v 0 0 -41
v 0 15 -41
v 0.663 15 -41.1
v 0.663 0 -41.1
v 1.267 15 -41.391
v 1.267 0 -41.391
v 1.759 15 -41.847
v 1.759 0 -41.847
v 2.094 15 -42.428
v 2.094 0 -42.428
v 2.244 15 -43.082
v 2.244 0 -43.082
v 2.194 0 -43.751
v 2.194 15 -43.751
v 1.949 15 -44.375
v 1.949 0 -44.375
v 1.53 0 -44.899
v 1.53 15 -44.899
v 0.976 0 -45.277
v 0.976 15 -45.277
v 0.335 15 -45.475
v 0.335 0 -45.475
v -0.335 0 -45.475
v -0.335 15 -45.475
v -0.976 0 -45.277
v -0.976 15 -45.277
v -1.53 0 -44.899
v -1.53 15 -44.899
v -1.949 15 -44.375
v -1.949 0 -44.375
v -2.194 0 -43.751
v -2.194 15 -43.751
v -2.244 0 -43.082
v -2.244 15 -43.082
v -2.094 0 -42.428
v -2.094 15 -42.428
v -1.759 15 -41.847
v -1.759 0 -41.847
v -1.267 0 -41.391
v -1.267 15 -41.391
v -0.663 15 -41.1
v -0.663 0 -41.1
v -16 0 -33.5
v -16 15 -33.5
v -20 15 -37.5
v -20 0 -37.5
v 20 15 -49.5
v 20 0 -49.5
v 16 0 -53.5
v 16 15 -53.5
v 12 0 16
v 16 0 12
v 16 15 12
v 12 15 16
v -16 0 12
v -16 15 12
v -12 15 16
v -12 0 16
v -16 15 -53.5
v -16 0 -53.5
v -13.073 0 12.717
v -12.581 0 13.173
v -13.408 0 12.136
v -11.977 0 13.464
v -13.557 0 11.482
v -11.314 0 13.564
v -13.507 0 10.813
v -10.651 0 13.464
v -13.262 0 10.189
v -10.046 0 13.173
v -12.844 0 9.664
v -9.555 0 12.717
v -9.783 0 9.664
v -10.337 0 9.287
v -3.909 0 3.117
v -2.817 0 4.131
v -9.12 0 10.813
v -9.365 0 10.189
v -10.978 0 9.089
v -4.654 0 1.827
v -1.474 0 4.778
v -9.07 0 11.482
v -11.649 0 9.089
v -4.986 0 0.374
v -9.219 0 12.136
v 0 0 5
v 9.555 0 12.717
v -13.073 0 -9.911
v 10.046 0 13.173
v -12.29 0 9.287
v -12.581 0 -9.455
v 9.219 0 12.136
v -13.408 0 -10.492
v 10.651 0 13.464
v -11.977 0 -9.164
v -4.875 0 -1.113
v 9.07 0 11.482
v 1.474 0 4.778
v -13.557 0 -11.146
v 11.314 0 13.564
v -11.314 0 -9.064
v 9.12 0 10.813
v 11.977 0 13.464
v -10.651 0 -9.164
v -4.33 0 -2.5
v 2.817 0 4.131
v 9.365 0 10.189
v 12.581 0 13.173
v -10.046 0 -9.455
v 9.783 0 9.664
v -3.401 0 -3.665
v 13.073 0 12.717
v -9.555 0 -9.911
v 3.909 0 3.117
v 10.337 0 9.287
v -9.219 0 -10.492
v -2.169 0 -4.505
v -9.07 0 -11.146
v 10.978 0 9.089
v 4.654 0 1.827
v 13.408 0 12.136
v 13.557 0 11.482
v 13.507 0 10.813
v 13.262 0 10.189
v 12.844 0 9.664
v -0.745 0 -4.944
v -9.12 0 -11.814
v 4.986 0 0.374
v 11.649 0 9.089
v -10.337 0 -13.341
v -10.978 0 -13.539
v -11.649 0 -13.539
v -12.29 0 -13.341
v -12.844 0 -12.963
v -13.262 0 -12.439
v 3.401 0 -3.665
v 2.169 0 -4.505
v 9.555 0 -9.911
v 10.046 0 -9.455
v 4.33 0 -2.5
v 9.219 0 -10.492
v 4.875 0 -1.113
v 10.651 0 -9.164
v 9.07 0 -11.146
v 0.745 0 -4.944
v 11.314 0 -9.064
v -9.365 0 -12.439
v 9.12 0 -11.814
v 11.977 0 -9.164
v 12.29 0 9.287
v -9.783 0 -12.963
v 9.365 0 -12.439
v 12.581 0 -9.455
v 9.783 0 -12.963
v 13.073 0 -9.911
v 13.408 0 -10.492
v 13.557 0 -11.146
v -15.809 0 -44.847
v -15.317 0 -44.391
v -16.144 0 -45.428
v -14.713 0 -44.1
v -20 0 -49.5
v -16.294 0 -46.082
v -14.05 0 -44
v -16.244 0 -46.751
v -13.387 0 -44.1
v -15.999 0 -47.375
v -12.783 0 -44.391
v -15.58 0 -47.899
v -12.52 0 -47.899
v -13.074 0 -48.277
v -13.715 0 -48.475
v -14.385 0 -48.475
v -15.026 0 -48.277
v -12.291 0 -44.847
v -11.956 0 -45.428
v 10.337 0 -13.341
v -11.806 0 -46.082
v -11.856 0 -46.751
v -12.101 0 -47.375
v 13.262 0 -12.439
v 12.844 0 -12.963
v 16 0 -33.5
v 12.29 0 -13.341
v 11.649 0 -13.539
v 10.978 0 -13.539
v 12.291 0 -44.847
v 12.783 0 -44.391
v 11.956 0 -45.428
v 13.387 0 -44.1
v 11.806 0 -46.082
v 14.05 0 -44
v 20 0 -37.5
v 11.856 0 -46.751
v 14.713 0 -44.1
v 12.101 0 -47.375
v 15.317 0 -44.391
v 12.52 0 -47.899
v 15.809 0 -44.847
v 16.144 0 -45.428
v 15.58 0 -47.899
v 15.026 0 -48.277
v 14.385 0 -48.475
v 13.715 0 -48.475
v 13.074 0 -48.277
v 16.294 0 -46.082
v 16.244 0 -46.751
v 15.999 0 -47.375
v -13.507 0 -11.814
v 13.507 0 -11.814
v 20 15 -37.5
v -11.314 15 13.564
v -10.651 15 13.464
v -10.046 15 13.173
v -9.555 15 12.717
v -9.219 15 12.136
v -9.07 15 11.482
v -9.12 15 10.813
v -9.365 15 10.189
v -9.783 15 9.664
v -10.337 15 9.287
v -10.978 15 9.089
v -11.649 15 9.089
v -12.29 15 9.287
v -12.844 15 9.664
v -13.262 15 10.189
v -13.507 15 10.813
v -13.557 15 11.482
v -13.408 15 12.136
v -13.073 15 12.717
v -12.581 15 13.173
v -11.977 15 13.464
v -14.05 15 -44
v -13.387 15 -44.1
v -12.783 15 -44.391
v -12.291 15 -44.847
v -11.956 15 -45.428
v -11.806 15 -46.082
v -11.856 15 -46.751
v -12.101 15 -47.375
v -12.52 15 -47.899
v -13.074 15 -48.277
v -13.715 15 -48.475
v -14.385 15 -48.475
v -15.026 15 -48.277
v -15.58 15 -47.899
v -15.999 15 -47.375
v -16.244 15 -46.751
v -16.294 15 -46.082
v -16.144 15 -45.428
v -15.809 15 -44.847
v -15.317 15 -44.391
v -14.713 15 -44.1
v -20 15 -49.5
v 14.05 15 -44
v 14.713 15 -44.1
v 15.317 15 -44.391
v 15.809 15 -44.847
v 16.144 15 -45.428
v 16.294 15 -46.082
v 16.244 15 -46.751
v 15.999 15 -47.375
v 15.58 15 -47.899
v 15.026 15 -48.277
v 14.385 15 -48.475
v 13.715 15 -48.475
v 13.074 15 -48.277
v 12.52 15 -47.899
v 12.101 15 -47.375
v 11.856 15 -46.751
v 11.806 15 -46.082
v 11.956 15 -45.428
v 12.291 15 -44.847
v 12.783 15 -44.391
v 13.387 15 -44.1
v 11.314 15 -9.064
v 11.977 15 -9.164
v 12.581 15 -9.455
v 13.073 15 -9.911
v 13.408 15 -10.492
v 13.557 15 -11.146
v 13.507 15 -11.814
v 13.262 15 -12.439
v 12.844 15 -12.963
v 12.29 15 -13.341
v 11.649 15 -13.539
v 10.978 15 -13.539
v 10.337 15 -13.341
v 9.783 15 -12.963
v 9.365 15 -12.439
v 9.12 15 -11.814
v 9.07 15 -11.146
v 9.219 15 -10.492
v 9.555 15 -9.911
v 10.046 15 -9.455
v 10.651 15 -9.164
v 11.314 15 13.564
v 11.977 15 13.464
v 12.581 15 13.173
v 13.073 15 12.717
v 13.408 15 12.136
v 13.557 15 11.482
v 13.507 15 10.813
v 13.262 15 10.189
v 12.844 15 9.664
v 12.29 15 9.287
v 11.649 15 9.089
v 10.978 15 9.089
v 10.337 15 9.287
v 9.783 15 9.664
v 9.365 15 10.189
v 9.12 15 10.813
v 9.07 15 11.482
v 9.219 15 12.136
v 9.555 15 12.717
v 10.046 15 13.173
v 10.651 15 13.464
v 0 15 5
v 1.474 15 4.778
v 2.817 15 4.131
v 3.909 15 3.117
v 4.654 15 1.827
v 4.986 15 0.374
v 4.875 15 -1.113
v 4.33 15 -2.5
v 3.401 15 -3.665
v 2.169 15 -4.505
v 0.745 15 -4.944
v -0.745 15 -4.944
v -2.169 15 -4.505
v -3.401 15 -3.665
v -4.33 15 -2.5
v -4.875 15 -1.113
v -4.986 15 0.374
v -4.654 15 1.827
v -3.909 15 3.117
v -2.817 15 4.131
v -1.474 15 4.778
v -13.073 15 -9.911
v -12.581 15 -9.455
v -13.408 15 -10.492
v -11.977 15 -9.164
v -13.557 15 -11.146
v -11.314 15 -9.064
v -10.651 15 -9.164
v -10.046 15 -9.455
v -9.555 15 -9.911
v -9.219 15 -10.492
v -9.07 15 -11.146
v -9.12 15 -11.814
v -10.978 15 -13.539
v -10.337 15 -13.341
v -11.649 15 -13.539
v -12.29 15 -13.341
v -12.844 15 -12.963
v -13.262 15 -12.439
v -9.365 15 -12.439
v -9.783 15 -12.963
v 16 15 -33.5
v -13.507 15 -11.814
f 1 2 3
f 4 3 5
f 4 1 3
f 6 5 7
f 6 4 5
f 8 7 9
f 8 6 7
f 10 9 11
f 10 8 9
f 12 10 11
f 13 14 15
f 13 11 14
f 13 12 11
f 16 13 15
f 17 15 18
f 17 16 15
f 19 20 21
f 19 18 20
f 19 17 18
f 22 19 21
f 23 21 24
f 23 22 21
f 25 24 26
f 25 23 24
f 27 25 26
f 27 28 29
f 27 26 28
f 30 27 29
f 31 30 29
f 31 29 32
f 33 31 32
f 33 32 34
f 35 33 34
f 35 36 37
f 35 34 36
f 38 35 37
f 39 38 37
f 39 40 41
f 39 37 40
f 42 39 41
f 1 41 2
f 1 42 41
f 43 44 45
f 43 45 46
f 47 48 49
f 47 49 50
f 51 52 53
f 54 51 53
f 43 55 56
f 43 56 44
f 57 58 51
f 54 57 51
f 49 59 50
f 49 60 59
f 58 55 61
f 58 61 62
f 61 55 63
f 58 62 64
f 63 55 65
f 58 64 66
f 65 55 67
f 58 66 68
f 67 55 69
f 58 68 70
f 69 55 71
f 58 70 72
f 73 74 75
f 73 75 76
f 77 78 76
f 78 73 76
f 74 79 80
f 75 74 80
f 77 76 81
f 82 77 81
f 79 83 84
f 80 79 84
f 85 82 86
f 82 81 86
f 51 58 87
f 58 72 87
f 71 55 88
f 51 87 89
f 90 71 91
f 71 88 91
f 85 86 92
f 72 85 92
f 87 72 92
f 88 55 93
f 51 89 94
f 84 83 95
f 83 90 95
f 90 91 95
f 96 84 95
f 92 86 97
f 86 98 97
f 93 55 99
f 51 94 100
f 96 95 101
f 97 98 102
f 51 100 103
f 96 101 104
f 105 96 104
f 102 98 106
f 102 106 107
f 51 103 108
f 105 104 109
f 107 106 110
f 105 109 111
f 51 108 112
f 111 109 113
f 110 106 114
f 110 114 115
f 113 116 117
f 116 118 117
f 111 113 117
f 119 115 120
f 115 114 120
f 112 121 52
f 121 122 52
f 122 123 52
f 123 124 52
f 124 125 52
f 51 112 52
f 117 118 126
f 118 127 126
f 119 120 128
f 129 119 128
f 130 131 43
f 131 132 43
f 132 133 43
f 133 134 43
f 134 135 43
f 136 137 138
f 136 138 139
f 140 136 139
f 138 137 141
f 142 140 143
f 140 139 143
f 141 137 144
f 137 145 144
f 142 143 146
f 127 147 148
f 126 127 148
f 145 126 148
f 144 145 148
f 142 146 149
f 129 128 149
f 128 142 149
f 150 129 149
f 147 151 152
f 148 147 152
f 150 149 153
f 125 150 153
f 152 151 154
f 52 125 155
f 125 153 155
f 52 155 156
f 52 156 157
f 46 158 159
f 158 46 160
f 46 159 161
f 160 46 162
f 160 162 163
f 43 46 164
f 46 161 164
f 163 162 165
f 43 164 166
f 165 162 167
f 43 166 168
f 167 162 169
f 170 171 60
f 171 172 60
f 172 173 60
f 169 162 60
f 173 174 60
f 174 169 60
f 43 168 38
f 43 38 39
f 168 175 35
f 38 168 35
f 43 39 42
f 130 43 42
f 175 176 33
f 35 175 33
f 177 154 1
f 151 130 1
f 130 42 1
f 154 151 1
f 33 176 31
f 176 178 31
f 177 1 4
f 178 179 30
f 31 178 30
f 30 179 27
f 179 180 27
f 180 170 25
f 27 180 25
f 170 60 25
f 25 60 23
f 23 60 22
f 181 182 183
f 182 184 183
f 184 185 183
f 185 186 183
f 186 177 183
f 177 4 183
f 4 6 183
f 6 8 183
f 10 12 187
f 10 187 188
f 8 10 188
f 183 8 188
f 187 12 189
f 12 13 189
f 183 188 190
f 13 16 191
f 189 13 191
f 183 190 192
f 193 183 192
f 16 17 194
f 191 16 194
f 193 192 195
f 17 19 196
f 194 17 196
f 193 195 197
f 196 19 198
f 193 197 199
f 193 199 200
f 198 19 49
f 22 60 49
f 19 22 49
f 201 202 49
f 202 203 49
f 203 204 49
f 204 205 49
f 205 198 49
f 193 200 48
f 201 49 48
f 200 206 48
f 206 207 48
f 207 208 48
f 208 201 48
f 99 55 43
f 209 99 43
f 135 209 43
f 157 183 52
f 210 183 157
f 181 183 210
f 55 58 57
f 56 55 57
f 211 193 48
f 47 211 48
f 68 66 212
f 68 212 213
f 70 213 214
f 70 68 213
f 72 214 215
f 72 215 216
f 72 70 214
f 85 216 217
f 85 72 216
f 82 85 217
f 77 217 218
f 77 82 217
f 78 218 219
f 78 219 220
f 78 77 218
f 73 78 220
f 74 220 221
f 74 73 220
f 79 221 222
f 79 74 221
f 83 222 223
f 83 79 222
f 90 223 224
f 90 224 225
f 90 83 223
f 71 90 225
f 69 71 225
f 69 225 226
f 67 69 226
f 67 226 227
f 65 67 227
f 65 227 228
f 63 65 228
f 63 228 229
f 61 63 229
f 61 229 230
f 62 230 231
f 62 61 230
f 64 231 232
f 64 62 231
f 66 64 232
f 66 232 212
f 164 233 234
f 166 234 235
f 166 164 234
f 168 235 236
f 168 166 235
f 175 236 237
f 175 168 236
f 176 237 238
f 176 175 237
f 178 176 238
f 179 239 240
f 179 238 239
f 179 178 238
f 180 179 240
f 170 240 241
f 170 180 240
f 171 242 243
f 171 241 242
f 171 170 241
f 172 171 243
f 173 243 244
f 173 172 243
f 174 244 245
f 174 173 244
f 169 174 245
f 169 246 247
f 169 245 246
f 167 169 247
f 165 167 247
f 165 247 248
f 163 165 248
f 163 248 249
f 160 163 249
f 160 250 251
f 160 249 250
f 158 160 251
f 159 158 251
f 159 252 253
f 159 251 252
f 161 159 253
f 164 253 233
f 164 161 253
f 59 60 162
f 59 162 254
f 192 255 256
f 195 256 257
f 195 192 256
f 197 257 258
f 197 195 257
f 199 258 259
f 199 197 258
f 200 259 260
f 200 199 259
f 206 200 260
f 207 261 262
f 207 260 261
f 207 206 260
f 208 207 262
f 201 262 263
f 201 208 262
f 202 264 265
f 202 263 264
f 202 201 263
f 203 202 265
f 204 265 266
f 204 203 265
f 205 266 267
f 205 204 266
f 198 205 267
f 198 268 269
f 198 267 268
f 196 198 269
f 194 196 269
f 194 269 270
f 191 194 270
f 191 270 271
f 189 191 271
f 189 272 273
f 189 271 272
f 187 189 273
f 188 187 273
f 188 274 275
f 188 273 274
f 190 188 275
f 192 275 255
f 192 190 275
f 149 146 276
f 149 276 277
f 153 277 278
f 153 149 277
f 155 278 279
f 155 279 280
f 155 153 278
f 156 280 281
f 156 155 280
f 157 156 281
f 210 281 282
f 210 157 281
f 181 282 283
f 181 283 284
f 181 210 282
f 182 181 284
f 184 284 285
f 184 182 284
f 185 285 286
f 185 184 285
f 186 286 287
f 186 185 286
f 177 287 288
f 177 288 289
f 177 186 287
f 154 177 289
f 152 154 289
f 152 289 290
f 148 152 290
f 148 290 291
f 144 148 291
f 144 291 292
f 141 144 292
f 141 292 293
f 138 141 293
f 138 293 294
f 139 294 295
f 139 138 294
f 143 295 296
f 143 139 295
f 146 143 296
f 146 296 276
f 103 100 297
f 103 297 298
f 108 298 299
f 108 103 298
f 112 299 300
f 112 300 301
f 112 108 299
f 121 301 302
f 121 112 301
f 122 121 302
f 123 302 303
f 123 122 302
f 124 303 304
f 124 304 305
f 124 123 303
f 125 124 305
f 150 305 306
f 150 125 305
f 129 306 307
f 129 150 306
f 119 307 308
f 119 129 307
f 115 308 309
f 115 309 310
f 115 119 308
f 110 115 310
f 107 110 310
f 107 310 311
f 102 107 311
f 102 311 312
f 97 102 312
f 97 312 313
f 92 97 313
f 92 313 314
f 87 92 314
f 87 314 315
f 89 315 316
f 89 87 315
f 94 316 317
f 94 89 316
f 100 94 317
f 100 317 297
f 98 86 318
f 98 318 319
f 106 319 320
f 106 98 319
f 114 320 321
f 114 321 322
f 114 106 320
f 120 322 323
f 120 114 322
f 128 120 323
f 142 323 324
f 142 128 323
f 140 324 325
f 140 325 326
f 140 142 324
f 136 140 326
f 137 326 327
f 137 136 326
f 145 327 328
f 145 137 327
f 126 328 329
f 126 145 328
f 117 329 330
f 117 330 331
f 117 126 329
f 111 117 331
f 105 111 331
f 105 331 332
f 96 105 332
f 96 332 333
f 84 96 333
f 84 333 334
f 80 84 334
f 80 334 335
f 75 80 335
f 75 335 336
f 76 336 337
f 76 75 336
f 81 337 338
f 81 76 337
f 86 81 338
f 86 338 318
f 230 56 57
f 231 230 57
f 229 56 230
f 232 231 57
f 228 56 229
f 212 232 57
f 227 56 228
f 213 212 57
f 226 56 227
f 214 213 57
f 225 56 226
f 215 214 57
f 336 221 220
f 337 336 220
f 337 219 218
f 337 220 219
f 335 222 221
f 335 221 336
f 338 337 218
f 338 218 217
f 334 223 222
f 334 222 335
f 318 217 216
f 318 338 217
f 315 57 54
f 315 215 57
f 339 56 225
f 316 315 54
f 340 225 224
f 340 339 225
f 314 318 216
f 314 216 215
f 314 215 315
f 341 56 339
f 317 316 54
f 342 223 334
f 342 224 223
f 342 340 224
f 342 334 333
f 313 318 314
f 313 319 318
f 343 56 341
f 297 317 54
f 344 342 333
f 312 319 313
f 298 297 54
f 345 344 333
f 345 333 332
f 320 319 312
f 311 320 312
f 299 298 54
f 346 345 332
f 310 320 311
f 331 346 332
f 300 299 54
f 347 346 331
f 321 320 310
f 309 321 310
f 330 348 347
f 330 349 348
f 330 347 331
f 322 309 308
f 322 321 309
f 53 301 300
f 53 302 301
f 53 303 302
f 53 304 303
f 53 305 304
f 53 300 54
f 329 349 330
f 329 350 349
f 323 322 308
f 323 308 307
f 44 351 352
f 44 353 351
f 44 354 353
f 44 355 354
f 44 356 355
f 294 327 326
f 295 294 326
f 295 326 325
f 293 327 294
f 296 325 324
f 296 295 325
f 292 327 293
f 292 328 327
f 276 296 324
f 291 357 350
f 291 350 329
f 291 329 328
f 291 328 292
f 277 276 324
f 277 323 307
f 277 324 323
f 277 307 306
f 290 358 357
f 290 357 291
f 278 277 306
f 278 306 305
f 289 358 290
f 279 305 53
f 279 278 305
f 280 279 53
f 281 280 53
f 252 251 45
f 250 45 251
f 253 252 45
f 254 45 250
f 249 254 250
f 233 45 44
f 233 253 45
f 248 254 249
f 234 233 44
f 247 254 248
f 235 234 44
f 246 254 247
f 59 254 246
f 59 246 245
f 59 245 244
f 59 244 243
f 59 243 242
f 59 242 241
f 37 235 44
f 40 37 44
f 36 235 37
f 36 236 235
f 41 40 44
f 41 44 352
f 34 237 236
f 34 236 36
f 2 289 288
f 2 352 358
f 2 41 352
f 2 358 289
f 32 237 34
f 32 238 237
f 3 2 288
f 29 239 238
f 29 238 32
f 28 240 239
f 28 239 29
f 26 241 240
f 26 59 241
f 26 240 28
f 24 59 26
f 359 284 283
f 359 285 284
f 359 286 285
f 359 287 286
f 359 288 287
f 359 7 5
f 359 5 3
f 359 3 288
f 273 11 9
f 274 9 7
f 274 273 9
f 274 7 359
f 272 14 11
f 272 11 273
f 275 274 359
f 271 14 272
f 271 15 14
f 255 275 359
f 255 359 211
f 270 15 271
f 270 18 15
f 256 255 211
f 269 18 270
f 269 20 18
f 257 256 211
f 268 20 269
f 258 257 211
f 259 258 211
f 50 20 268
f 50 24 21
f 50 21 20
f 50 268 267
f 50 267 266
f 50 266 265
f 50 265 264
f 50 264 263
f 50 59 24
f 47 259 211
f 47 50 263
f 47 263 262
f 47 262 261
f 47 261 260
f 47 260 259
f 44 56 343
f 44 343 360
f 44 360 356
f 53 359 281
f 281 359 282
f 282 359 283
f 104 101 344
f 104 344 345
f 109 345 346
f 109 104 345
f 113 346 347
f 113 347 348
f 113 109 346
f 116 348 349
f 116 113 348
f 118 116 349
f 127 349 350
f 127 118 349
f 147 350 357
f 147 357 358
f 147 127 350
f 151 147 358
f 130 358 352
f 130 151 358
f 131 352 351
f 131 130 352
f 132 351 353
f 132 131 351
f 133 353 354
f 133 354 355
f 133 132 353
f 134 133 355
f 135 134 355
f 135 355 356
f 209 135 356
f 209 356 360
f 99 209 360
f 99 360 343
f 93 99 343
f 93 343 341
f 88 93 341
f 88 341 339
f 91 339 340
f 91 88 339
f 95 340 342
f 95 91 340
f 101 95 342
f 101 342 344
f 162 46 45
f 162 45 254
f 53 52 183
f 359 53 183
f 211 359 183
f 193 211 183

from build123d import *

# Parameters (mm, degrees)
SKETCH1_W           = 32
SKETCH1_H           = 69.5
SKETCH1_R           = 5
SKETCH1_R_2         = 2.25
BOSS_EXTRUDE1_DEPTH = 15
SKETCH7_W           = 40
SKETCH7_H           = 16
BOSS_EXTRUDE6_DEPTH = 15
SKETCH5_R           = 2.25
CUT_EXTRUDE2_DEPTH  = 60.052942348
CHAMFER1_SIZE       = 4


with BuildPart() as part:
    # Sketch1 → Boss-Extrude1 (new body)
    with BuildSketch(Plane(origin=(0, 0, 0), x_dir=(1, 0, 0), z_dir=(0, 1, 0))):
        with Locations((0, 18.75)):
            Rectangle(SKETCH1_W, SKETCH1_H)
        with Locations(Location((0, 0, 0), (0, 0, 270))):
            Circle(SKETCH1_R, mode=Mode.SUBTRACT)
        with Locations(Location((11.313708499, -11.313708499, 0), (0, 0, 270))):
            Circle(SKETCH1_R_2, mode=Mode.SUBTRACT)
        with Locations(Location((11.313708499, 11.313708499, 0), (0, 0, 270))):
            Circle(SKETCH1_R_2, mode=Mode.SUBTRACT)
        with Locations(Location((-11.313708499, 11.313708499, 0), (0, 0, 270))):
            Circle(SKETCH1_R_2, mode=Mode.SUBTRACT)
        with Locations(Location((-11.313708499, -11.313708499, 0), (0, 0, 270))):
            Circle(SKETCH1_R_2, mode=Mode.SUBTRACT)
    extrude(amount=BOSS_EXTRUDE1_DEPTH)

    # Sketch7 → Boss-Extrude6 (add)
    with BuildSketch(Plane(origin=(0, 0, 0), x_dir=(1, 0, 0), z_dir=(0, 1, 0))):
        with Locations((0, 45.5)):
            Rectangle(SKETCH7_W, SKETCH7_H)
    extrude(amount=BOSS_EXTRUDE6_DEPTH)

    # Sketch5 → Cut-Extrude2 (cut, through all)
    with BuildSketch(Plane(origin=(0, 0, 0), x_dir=(1, 0, 0), z_dir=(0, 1, 0))):
        with Locations(Location((0, 43.25, 0), (0, 0, 270))):
            Circle(SKETCH5_R)
        with Locations(Location((14.05, 46.25, 0), (0, 0, 270))):
            Circle(SKETCH5_R)
        with Locations(Location((-14.05, 46.25, 0), (0, 0, 270))):
            Circle(SKETCH5_R)
    extrude(amount=CUT_EXTRUDE2_DEPTH, mode=Mode.SUBTRACT)

    # Chamfer1
    chamfer1_edges = [part.edges().sort_by_distance(p)[0] for p in [
        (16, 7.5, 16),
        (-16, 7.5, 16),
        (-16, 7.5, -37.5),
        (16, 7.5, -37.5),
        (20, 7.5, -53.5),
        (-20, 7.5, -53.5),
    ]]
    chamfer(chamfer1_edges, length=CHAMFER1_SIZE - 0.0001)  # a hair under: the kernel refuses the full size


solid = part.part
